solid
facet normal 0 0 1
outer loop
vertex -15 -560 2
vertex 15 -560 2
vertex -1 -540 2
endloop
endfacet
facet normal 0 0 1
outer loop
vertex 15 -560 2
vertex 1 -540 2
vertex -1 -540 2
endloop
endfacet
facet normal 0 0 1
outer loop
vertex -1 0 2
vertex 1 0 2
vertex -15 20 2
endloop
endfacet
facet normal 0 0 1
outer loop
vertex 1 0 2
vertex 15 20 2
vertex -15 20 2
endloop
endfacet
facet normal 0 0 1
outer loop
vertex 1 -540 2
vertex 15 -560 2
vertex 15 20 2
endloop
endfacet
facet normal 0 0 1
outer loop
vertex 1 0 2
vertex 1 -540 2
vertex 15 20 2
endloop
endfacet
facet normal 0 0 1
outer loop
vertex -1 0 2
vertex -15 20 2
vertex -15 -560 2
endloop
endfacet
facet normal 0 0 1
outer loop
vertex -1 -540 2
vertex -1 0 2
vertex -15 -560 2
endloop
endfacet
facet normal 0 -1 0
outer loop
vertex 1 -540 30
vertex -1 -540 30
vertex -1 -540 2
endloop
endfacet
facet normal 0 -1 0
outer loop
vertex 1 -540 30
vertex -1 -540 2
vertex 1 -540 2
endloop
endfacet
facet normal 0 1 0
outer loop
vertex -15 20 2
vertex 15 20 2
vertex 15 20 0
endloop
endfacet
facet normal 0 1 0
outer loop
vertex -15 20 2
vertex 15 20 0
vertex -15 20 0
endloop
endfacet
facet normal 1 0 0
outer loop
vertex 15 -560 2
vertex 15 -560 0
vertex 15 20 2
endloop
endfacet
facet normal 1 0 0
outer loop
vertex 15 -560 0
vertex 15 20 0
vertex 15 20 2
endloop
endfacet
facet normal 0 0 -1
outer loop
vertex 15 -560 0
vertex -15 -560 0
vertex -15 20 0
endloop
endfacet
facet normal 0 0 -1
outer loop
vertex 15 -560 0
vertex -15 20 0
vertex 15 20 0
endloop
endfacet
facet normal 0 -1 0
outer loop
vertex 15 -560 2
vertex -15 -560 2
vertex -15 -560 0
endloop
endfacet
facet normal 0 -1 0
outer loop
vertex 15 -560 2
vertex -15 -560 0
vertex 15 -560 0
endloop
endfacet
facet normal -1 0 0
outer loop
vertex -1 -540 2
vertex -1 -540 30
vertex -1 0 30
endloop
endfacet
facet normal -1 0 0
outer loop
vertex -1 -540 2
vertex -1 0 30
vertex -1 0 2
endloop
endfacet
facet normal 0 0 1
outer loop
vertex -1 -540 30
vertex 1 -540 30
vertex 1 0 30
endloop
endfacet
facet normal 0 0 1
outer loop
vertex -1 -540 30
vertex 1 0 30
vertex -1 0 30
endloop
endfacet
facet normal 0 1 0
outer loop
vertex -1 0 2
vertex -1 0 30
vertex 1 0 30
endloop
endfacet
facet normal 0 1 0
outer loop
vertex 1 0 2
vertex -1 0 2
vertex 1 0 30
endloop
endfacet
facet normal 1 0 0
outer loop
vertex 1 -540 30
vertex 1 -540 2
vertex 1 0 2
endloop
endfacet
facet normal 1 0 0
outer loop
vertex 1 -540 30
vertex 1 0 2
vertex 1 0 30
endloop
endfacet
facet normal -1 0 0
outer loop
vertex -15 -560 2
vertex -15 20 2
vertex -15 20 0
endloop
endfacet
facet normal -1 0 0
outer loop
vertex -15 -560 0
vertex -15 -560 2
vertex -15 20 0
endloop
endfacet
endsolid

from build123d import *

# Parameters (mm, degrees)
F1_DEPTH = 540
F3_DEPTH = 20
F5_DEPTH = 20


with BuildPart() as f1:
    # F0 (on Front) → F1 (new body)
    with BuildSketch(Plane.XZ):
        Polygon((1, 30), (0, 30), (-1, 30), (-1, 2), (-15, 2), (-15, 0), (0, 0), (15, 0), (15, 2), (1, 2), align=None)
    extrude(amount=F1_DEPTH)

    # F2 (on face) → F3 (join)
    with BuildSketch(Plane(origin=(0, 0, 0), x_dir=(-1, 0, 0), z_dir=(0, 1, 0))):
        Polygon((-1, 2), (-15, 2), (-15, 0), (15, 0), (15, 2), (1, 2), align=None)
    extrude(amount=F3_DEPTH)

    # F4 (on face) → F5 (join)
    with BuildSketch(Plane.XZ.offset(540)):
        Polygon((-1, 2), (-15, 2), (-15, 0), (15, 0), (15, 2), (1, 2), align=None)
    extrude(amount=F5_DEPTH)


solid = f1.part
